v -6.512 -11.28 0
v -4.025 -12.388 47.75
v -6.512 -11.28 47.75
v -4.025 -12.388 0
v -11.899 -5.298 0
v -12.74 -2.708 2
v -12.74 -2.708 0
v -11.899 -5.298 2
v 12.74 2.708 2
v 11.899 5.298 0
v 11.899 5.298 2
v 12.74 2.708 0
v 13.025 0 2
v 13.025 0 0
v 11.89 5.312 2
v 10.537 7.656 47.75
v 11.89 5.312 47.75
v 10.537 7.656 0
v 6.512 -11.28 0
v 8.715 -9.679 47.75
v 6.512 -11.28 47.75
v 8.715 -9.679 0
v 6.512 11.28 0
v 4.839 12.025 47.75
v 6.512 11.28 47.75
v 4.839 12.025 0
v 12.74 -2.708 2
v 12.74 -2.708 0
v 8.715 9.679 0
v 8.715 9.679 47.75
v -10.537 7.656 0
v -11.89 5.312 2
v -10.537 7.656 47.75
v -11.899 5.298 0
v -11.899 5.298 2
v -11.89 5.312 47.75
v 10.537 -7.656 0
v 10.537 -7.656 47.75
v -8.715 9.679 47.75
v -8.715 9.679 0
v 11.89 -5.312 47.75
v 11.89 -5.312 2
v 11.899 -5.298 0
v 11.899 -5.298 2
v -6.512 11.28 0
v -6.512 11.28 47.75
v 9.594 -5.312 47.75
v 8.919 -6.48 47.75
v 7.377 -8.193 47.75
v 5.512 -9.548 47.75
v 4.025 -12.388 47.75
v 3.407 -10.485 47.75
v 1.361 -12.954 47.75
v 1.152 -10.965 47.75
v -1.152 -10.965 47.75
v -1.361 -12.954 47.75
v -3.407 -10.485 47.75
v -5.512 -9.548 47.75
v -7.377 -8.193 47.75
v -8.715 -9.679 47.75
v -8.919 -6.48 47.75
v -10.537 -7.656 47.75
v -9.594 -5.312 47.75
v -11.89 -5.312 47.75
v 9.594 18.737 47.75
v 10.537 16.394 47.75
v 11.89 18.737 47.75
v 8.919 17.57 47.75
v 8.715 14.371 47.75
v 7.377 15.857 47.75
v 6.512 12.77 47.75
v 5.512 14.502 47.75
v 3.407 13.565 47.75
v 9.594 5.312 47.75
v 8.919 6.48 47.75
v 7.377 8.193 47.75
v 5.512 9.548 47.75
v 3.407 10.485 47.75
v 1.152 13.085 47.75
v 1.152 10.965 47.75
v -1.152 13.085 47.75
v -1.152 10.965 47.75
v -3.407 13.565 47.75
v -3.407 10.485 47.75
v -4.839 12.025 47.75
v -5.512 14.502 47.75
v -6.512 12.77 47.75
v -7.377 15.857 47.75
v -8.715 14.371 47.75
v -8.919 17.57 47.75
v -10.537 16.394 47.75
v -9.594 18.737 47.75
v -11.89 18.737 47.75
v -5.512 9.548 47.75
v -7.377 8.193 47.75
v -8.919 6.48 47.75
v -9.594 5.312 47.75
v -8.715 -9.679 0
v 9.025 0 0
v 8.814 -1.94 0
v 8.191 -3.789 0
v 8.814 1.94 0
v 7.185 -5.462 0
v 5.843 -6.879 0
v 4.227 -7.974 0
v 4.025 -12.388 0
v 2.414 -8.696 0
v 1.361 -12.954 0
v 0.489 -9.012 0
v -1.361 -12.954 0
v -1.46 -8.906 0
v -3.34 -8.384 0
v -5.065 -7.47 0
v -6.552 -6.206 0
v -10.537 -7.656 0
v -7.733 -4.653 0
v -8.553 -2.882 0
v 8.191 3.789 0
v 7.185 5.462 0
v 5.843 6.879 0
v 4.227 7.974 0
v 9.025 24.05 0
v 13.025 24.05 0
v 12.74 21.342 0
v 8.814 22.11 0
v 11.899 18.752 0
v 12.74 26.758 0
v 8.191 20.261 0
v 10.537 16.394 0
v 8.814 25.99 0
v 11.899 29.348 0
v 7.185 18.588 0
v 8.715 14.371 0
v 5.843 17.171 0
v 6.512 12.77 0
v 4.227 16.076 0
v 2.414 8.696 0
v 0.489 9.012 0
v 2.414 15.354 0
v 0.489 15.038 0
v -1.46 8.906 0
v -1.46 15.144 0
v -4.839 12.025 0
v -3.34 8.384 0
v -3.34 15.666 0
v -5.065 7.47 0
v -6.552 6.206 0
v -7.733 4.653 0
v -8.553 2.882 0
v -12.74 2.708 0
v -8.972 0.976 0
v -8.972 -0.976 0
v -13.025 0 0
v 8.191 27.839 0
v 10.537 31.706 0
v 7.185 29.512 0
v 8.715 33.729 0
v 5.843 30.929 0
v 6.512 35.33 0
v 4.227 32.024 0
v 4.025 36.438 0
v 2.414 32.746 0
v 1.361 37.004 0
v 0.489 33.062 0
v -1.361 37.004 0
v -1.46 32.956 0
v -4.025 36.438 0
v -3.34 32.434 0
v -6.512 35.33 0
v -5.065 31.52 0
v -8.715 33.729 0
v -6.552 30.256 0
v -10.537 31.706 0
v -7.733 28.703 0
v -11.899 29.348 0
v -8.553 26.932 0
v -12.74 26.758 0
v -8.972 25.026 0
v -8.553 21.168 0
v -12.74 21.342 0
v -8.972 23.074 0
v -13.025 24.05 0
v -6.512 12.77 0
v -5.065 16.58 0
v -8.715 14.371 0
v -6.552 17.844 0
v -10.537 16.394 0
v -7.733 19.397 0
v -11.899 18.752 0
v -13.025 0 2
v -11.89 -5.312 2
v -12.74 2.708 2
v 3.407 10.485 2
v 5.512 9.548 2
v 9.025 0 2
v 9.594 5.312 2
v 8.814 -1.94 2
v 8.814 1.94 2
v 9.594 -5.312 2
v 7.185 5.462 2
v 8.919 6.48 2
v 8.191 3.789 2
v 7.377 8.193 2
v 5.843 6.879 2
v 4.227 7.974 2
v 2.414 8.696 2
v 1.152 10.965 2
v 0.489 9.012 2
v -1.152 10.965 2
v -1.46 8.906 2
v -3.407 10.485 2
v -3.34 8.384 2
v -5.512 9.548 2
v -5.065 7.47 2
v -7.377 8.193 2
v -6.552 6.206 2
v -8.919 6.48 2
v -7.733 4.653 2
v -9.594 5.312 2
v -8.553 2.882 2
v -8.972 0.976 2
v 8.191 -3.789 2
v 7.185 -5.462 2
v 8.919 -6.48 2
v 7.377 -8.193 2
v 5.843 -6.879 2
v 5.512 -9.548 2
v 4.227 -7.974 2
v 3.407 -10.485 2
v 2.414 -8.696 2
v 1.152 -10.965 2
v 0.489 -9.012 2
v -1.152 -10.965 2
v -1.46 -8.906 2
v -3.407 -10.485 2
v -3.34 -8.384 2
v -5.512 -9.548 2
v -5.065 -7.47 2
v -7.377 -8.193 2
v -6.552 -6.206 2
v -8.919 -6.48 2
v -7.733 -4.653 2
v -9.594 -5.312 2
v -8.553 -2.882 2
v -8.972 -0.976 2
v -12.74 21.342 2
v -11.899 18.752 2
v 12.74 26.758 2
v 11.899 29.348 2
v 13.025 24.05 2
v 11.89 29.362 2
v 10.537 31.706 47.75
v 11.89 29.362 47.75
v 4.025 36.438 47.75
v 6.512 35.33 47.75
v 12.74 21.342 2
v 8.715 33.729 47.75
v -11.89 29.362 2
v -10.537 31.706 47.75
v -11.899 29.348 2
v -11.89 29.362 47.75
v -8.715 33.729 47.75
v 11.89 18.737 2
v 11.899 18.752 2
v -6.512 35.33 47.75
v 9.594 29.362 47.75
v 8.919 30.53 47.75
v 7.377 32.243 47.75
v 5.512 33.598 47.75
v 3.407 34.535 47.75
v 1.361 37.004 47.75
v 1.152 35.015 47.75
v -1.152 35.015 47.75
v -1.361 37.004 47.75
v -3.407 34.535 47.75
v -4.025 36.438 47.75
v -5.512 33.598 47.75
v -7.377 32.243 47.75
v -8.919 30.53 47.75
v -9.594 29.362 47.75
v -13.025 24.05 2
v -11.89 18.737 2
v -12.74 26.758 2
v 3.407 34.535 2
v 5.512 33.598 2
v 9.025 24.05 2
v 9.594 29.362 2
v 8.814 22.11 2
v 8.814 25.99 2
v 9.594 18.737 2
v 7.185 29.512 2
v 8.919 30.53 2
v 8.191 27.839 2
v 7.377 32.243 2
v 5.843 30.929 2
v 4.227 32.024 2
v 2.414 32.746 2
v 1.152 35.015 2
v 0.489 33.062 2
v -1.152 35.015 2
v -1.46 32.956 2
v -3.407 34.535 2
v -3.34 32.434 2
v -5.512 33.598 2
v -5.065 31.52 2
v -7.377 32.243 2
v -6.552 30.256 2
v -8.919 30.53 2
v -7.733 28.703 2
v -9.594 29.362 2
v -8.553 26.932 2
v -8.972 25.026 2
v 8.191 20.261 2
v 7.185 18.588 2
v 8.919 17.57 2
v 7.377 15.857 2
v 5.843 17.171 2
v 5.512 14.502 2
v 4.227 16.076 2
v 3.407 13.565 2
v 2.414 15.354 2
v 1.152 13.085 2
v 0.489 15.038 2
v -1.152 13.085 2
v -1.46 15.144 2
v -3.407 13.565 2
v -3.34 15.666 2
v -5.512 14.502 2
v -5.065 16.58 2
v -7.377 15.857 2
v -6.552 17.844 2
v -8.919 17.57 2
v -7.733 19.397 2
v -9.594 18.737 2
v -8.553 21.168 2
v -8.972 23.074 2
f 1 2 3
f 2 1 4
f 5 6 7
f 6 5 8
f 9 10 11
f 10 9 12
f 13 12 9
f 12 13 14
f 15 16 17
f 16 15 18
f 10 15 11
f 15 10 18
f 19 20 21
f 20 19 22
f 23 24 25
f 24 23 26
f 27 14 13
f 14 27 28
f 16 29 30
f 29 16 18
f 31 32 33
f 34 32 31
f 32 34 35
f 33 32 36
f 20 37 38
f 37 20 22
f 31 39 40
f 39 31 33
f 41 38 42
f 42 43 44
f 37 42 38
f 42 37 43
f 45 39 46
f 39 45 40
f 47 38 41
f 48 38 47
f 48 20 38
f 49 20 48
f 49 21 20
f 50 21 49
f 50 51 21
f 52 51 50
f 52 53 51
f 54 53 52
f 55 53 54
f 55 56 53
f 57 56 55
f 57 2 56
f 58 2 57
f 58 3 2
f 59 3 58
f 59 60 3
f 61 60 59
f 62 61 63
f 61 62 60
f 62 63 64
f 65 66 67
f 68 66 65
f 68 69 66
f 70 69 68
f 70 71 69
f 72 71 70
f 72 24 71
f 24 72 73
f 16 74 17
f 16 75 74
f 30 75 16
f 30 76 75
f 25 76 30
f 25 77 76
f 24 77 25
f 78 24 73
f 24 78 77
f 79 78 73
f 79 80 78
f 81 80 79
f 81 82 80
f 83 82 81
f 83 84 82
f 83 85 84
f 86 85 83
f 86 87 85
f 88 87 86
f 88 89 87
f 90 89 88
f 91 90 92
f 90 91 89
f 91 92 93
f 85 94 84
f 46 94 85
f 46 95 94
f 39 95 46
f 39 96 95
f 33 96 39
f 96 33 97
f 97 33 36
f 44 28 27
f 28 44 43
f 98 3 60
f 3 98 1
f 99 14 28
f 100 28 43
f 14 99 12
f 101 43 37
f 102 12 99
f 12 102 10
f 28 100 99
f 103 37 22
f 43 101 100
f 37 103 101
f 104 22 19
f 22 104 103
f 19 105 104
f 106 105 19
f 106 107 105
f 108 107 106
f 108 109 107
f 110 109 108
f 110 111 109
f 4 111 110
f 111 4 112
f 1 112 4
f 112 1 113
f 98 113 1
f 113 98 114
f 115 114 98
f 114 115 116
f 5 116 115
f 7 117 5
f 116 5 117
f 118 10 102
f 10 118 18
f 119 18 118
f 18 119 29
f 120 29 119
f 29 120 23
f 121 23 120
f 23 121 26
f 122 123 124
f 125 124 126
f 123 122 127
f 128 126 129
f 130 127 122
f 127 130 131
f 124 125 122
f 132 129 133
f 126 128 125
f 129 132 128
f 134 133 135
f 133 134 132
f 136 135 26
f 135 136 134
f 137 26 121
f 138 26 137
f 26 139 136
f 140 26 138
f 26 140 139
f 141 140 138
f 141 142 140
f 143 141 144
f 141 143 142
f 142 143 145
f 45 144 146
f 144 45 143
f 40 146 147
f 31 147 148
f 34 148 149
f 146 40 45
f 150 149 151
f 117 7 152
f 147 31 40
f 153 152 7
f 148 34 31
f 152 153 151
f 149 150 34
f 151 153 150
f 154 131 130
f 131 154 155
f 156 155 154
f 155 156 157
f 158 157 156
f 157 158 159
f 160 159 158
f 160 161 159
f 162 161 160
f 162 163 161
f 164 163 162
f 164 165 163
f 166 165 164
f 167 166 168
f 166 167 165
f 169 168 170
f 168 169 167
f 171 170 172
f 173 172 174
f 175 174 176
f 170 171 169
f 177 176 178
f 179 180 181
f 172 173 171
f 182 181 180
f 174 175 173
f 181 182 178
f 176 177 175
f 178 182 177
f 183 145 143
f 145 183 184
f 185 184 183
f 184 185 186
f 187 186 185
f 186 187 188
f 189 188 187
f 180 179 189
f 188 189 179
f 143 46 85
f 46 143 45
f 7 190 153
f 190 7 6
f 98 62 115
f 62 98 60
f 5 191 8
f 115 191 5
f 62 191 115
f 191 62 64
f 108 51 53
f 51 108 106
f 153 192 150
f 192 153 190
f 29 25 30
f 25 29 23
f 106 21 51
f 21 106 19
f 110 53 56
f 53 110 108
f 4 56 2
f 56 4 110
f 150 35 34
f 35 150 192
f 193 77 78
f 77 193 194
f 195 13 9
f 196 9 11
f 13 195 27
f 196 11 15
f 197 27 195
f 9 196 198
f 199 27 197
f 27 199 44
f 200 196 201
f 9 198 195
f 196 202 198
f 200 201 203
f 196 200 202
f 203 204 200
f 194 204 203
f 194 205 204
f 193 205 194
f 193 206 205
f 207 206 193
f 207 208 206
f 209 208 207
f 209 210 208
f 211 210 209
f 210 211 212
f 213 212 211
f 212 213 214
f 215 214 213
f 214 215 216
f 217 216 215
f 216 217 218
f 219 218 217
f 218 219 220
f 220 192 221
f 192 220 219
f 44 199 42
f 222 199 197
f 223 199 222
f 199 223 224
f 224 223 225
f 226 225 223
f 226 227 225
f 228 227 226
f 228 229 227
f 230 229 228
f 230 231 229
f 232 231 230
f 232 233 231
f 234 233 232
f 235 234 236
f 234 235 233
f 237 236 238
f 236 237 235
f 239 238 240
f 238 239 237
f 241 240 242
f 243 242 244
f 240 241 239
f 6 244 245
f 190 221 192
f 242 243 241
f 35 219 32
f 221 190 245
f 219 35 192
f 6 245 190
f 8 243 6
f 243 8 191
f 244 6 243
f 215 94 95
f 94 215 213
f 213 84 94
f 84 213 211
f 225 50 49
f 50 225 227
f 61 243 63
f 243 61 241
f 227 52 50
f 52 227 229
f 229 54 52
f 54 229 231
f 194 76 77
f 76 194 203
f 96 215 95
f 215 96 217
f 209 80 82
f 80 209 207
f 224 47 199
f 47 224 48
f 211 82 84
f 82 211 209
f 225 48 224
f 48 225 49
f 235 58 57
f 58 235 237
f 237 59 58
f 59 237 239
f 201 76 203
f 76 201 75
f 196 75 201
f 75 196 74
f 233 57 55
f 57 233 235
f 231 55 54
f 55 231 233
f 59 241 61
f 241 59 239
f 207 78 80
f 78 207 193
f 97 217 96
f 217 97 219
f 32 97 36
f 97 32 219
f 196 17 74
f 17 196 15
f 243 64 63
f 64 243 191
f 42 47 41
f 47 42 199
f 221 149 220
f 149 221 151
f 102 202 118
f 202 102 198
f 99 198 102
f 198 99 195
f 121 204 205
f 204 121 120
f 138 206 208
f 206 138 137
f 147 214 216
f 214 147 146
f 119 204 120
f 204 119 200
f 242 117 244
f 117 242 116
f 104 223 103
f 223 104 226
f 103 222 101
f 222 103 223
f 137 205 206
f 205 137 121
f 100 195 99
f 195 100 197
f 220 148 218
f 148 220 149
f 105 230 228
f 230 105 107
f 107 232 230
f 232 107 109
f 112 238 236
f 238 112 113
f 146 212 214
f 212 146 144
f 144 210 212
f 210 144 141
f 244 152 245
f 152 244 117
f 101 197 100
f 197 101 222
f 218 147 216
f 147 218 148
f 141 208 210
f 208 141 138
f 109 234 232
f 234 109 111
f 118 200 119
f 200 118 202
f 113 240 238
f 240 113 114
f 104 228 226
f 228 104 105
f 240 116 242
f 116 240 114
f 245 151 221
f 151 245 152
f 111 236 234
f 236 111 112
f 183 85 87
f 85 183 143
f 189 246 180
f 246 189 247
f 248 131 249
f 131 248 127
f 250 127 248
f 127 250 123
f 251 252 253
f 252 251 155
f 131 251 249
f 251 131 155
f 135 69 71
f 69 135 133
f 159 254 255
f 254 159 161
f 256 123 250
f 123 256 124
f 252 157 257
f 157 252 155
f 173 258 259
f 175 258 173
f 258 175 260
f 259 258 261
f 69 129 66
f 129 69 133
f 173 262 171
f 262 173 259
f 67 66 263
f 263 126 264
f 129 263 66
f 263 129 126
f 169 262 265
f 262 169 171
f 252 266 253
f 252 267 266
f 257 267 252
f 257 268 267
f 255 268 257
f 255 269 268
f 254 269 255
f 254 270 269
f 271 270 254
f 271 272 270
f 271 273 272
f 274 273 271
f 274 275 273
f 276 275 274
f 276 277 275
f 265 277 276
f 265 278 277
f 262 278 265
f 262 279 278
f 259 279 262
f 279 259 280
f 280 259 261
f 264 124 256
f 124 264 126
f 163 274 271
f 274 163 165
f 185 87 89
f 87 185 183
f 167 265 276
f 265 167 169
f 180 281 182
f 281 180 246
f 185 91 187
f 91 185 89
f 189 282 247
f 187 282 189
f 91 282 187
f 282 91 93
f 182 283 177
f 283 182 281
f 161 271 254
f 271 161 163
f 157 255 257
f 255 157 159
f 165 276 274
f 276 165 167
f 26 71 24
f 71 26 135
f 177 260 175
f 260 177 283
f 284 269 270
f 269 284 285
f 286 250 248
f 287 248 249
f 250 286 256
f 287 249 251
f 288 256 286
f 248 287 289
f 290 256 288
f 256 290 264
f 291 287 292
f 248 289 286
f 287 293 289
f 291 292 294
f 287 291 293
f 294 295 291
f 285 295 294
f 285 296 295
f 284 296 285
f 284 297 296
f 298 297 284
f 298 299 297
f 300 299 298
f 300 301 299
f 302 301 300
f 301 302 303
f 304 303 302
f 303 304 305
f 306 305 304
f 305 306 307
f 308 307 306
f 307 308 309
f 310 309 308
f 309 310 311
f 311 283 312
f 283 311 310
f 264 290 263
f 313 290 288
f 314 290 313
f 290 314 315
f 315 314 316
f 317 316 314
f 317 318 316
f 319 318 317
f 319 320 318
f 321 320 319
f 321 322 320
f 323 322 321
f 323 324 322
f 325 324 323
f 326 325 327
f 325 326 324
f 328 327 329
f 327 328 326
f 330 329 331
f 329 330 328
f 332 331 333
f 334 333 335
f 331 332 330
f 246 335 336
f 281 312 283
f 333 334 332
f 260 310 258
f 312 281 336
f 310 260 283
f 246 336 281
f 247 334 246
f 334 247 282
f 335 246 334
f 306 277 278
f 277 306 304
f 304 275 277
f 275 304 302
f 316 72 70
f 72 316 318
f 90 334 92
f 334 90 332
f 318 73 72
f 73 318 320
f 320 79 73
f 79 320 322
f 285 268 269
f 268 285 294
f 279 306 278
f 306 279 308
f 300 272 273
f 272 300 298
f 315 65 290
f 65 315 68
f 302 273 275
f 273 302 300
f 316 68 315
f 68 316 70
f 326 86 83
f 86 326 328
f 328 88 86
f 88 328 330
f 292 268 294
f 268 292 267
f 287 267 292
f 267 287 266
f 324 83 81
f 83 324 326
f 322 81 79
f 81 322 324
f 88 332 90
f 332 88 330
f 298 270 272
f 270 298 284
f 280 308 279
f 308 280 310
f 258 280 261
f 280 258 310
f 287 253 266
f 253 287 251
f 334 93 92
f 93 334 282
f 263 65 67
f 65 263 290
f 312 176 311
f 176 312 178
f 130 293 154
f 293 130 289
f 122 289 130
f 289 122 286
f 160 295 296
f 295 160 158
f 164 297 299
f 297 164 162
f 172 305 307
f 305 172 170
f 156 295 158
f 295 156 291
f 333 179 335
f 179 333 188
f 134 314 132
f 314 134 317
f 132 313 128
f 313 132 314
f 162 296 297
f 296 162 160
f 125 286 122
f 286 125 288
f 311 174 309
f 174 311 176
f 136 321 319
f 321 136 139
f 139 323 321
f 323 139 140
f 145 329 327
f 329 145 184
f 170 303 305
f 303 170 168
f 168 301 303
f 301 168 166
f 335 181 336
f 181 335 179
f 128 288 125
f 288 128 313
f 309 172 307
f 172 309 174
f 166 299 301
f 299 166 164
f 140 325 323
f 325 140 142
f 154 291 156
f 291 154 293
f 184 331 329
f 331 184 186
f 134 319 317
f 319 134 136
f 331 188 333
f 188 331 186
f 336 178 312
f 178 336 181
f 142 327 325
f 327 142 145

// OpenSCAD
/*
 * PARAMETRIC COIN TUBES + CAP
 * VERSION 1.3.1
 * last update: 02/12/13
 * design by newq 
 * mod kitwallace (thanks!)
 */

// 
// the generated tubes insides are 2 coins higher than the number of coins they fit

coin_type = 5; // [ 0:1 Euro, 1:2 Euro, 2:50 Euro cents,  3:20 Euro cents, 4:10 Euro cents, 5:5 Euro cents, 6:2 Euro cent, 7: 1 Euro cent, 8: 1 US Dollar, 9: 0.50 US Dollar, 10: 0.25 US Dollar, 11: 0.10 US Dollar, 12: 0.05 US Dollar, 13: 0.01 US Dollar, 14: 2 Canadian Dollar, 15: 1 Canadian Dollar, 16: 0.50 Canadian Dollar, 17: 0.25 Canadian Dollar, 18: 0.10 Canadian Dollar, 19: 0.05 Canadian Dollar, 20: 0.01 Canadian Dollar]

// how many stacked coins should fit in a tube
number_of_coins = 25; 
number_of_tubes = 2; 

// Do you want to print the tubes?
generate_tube = 1; // [1:Yes, 0:No] 
// Do you want a cap to close the tube?
generate_cap = 0; // [1:Yes, 0:No] 
// thickness of wall and bottom (mm)
tube_wall = 2;  
// clearance from coin to wall of tube (mm) 
clearance = 0.4;
// if the cap fits too tight you might decrease slightly
fudge_factor = 0.975; 

// NOTHING TO SEE HERE :)

// coin data - name, diameter, height
coins = [ 
              ["1 Euro", 23.25, 2.33], 
              ["2 Euro", 25.75, 2.20],
              ["50 Euro cents", 24.25, 2.38],
              ["20 Euro cents", 22.25, 2.14],
              ["10 Euro cents", 19.75, 1.93],
              ["5 Euro cents", 21.25, 1.67],
              ["2 Euro cents", 18.75, 1.67],
              ["1 Euro cents", 16.25, 1.67],
              ["1 US Dollar", 26.50, 2.00],
              ["0.50 US Dollar", 30.61, 2.15],
              ["0.25 US Dollar", 24.26, 1.75],
              ["0.10 US Dollar", 17.91, 1.35],
              ["0.05 US Dollar", 21.21, 1.95],
              ["0.01 US Dollar", 19.05, 1.55],
              ["2 Canadian Dollar", 28.00, 1.80],
              ["1 Canadian Dollar", 26.50, 1.75],
              ["0.50 Canadian Dollar", 27.13, 1.95],
              ["0.25 Canadian Dollar", 23.88, 1.58],
              ["0.10 Canadian Dollar", 18.03, 1.22],
              ["0.05 Canadian Dollar", 21.2, 1.76],
              ["0.01 Canadian Dollar", 19.05, 1.45]
            ];

coin_diameter = coins[coin_type][1];
coin_height = coins[coin_type][2];

// generating the tubes
if (generate_tube) {
  assign(cyl_inner_h = (coin_height * number_of_coins) + (4 * tube_wall),
             cyl_inner_r = (coin_diameter / 2) + clearance,

             cyl_outer_h = (coin_height * number_of_coins) + (3 * tube_wall),
             cyl_outer_r = (coin_diameter / 2) + tube_wall + clearance,

             cutout_x = coin_diameter + (4 * tube_wall),
             cutout_y = (coin_diameter / 2),
             cutout_z = (coin_height * number_of_coins) + (3 * tube_wall)
             )


  for (z = [0 : (number_of_tubes-1)]){

	translate (v = [0, z * (cyl_outer_r * 2 - tube_wall), 0]){
		difference(){	
			difference(){
				difference() {
					// outer tube
					cylinder(h = cyl_outer_h, r = cyl_outer_r);
					// inner tube
					translate(v = [0, 0, tube_wall]) {
						cylinder(h = cyl_inner_h, r = cyl_inner_r);
					}
				}
				// round bottom cutout
				translate (v = [0, 0, ((cutout_z / 2) + tube_wall)]){
					cube(size = [cutout_x, cutout_y, cutout_z], center = true);
				}
			}
			// cutout
			translate (v = [0, 0, -tube_wall]){
				cylinder(h = (cyl_inner_h + tube_wall), r = (cyl_inner_r - tube_wall));
			}
		}
   }
}

}

// generating the tube tops

if (generate_cap) {
   assign (cyl_inner_h = 3*tube_wall - clearance,
               cyl_inner_r = ((coin_diameter / 2) + clearance) * fudge_factor,

               cyl_outer_h = tube_wall,
               cyl_outer_r = (coin_diameter / 2) + tube_wall + clearance,

               cutout_x = coin_diameter + (4 * tube_wall),
               cutout_y = (coin_diameter / 2) * fudge_factor,
               cutout_z = 3*tube_wall - clearance
             )
    translate([1.5 * coin_diameter + tube_wall, 0, 0]){
	for (z = [0 : (number_of_tubes-1)]){
		
		translate (v = [0, z * (cyl_outer_r * 2 - tube_wall), 0]){
			difference(){
				union(){		
					cylinder(h = cyl_outer_h, r = cyl_outer_r);
					cylinder(h = cyl_inner_h, r = cyl_inner_r);
				
					intersection(){
						translate([0,0,cutout_z/2]){
							cube(size = [cutout_x, cutout_y, cutout_z], center = true);
						}
						cylinder(h = cyl_outer_h+10, r = cyl_outer_r);
					}
				}
				
				translate([0,0,-(cyl_inner_h /2)]){
					cylinder(h = cyl_inner_h *2, r = cyl_inner_r - tube_wall);
				}			
			}		
		}
	}	
}
}
